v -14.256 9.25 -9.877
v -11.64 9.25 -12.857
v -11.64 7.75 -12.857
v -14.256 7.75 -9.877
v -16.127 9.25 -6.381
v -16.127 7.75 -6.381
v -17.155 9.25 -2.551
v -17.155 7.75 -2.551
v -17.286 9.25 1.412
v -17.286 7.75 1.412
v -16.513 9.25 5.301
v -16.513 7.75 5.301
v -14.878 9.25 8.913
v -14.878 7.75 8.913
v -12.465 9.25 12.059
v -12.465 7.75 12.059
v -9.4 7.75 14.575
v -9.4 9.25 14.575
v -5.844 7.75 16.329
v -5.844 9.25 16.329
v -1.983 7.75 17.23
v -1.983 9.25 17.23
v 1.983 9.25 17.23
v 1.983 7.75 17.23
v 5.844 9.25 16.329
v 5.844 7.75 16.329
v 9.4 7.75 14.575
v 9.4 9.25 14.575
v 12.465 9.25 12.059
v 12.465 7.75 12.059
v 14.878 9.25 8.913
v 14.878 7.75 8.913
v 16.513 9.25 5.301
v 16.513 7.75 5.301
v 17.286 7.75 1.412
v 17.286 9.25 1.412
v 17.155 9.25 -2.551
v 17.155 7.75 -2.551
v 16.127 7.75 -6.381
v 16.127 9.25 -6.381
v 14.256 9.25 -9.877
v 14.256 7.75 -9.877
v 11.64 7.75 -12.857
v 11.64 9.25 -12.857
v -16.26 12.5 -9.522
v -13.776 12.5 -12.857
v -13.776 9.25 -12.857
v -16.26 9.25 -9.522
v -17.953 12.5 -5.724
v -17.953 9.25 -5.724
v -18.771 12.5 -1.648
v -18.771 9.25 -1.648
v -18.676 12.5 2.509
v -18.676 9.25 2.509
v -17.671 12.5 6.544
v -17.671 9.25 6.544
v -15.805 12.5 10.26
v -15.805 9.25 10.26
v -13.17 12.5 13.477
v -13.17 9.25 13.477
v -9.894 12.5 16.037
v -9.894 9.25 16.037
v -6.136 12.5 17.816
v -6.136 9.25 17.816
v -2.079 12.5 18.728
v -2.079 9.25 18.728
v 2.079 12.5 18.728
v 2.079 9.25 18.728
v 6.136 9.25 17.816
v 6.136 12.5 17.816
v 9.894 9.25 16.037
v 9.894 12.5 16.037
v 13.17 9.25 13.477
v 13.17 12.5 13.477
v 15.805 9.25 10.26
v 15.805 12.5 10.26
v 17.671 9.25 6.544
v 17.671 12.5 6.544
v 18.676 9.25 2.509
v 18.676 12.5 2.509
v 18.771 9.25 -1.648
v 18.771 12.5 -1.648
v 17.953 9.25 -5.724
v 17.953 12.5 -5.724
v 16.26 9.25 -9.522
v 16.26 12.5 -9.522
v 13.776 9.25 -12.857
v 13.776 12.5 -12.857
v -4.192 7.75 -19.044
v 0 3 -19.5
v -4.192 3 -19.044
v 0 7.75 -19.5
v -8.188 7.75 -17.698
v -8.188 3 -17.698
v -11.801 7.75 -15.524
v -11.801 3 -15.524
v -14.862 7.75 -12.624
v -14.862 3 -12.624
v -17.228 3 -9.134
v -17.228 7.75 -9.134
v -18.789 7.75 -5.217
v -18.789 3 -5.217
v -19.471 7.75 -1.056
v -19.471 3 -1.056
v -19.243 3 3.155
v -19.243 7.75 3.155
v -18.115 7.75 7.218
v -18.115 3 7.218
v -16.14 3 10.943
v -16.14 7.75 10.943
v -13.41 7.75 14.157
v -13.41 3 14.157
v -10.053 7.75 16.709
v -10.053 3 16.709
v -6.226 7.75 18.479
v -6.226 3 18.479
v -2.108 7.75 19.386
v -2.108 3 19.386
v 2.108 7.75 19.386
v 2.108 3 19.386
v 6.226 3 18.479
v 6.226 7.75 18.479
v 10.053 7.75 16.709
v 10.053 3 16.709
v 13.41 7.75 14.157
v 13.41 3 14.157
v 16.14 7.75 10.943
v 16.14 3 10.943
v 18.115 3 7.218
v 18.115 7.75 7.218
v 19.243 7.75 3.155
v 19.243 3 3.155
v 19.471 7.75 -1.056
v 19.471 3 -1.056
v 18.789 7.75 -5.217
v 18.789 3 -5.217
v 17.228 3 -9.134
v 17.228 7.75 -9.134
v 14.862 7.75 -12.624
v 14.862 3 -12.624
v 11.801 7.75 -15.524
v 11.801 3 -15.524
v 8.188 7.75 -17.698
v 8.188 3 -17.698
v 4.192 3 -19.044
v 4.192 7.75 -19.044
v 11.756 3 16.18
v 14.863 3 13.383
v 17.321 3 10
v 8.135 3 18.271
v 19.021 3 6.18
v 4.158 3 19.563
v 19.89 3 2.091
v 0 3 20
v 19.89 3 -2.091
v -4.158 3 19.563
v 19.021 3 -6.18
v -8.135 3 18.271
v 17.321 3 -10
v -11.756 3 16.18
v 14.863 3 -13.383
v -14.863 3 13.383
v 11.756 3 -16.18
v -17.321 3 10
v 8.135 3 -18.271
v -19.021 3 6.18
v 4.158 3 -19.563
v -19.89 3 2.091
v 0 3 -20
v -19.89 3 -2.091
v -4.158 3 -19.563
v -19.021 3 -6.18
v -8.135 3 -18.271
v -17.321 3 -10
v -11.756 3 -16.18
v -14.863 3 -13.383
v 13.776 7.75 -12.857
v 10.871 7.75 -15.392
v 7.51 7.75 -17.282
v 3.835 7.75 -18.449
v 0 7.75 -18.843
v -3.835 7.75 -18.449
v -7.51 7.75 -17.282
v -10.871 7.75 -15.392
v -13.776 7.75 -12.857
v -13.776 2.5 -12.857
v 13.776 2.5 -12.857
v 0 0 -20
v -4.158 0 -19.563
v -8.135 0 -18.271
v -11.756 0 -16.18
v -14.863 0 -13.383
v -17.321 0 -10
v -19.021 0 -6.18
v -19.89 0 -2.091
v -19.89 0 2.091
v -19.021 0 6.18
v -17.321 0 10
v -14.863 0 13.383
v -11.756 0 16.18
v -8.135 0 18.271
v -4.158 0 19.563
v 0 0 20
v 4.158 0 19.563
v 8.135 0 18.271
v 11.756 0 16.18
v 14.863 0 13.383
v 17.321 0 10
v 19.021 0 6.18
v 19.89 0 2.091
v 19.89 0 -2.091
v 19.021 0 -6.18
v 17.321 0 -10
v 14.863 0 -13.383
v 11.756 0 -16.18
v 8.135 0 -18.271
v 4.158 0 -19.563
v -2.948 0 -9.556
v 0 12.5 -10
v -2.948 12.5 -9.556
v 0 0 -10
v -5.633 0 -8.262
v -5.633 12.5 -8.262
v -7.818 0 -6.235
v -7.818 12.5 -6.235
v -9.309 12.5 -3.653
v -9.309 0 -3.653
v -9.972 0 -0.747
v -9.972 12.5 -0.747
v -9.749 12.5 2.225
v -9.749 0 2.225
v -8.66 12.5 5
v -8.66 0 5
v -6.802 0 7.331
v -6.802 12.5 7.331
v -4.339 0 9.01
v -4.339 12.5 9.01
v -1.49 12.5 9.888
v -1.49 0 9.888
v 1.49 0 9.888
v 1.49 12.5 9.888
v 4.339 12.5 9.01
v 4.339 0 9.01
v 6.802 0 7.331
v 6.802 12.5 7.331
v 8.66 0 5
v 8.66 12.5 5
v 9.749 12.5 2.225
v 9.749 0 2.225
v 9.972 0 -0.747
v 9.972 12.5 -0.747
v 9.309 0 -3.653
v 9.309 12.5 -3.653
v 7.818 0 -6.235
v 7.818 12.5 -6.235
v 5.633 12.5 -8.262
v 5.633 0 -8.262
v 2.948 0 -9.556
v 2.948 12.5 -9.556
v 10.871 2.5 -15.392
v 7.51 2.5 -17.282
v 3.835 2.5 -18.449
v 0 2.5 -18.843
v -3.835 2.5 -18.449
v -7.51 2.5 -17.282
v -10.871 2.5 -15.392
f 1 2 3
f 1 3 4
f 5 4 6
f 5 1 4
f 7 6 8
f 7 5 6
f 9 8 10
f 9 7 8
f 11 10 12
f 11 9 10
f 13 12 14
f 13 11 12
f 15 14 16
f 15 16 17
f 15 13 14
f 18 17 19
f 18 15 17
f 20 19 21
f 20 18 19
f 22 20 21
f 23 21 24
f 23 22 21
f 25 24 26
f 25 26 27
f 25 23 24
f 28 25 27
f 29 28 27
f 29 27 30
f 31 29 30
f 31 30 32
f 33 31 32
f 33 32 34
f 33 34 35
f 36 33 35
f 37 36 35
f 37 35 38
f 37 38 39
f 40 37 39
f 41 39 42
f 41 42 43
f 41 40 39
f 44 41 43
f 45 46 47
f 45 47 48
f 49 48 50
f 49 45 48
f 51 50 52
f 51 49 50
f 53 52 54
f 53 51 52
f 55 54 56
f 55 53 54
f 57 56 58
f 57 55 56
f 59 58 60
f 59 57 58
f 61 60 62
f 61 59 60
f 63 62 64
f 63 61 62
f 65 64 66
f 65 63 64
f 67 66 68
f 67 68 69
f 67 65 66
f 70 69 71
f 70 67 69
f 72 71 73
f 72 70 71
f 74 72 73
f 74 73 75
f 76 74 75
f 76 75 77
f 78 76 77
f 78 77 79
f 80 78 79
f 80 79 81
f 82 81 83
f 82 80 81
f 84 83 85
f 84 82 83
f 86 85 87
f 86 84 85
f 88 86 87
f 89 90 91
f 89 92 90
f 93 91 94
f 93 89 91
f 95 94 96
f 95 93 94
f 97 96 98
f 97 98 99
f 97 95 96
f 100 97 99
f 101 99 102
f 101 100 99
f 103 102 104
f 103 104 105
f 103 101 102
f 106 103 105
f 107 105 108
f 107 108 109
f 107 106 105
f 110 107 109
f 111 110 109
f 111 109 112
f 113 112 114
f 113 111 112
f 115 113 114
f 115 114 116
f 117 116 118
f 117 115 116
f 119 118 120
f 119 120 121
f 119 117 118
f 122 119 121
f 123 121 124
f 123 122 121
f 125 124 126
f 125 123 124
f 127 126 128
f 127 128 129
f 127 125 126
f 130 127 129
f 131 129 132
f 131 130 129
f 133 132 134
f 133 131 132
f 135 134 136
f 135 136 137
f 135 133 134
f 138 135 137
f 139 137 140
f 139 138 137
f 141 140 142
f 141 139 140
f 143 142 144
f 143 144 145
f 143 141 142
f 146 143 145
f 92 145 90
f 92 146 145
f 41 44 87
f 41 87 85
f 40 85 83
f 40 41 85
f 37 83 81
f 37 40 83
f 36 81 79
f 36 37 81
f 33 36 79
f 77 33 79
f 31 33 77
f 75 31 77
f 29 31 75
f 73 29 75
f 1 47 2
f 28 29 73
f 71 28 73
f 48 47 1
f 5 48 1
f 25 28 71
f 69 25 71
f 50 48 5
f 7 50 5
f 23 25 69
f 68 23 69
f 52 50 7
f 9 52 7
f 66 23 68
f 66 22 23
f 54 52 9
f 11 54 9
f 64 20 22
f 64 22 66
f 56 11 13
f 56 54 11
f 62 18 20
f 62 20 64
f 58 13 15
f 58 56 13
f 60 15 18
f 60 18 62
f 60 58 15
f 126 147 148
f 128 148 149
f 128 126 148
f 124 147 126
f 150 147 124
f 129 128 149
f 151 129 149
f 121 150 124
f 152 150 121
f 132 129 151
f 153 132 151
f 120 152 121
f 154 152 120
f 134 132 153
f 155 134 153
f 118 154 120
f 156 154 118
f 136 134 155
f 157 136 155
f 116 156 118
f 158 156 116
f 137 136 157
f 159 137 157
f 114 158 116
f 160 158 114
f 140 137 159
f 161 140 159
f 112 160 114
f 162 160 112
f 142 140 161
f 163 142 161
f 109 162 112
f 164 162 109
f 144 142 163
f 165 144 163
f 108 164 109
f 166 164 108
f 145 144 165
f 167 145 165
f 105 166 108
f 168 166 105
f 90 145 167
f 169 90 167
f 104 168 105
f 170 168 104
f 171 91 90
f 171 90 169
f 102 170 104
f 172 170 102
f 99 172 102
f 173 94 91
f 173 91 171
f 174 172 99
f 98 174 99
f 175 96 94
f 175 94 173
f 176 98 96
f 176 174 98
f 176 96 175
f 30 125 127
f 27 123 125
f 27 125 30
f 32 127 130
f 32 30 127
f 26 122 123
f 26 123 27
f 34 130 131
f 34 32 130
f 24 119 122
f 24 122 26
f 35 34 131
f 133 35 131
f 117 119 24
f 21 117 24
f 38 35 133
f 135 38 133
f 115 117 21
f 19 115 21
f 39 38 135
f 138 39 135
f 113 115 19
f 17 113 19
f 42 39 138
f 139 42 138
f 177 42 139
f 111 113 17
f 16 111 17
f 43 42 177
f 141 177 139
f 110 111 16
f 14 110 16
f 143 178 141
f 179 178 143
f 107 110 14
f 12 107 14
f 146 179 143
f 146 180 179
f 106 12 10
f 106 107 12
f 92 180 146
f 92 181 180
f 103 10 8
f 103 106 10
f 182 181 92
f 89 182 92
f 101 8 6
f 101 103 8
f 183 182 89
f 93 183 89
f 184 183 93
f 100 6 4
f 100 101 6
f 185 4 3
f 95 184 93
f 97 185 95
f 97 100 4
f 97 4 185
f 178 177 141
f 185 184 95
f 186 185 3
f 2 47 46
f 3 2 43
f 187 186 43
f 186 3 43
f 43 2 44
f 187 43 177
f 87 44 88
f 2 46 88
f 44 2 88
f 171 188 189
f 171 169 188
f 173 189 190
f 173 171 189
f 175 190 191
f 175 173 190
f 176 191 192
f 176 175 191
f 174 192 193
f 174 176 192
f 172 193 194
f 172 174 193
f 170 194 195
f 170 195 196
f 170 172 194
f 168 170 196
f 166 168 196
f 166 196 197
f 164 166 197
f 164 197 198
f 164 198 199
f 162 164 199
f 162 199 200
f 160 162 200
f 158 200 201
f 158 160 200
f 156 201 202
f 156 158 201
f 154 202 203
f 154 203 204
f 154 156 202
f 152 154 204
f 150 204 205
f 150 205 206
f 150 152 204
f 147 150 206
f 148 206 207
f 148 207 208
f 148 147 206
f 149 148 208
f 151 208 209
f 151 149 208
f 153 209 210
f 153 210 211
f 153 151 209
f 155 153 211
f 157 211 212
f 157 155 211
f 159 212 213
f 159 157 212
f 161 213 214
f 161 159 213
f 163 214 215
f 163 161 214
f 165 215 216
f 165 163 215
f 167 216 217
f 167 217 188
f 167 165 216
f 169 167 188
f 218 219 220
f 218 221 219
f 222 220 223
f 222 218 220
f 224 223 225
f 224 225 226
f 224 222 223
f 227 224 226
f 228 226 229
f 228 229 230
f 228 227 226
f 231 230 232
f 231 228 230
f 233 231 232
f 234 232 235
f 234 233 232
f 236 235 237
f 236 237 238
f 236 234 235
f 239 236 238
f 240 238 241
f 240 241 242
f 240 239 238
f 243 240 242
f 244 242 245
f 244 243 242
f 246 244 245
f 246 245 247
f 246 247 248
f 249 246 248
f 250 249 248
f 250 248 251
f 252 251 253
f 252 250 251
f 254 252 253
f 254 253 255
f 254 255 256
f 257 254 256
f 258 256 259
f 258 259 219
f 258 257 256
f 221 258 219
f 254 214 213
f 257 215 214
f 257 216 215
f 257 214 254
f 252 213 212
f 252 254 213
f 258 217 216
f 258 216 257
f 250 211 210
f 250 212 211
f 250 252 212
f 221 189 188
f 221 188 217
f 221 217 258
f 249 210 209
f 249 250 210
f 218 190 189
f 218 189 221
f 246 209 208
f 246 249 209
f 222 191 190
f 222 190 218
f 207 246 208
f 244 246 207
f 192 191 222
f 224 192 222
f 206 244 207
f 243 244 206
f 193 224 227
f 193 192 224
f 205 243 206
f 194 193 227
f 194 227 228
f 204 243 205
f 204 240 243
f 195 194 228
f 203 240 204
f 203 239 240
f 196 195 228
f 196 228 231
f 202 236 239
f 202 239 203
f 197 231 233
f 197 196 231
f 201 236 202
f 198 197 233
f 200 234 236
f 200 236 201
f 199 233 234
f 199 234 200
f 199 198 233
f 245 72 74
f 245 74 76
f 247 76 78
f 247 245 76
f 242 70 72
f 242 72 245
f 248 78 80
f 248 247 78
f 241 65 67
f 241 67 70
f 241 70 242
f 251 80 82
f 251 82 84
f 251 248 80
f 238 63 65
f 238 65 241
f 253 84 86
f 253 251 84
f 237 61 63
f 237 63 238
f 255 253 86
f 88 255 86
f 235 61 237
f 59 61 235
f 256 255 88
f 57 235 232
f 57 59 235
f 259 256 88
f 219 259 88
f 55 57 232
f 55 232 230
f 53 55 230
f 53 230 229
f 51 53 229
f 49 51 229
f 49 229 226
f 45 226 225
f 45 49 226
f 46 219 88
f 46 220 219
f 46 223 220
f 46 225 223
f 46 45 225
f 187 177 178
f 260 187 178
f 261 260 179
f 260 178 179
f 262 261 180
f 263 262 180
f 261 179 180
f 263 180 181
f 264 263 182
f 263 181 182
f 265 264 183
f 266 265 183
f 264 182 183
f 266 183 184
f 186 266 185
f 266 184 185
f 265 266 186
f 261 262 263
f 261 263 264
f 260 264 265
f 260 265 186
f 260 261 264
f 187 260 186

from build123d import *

# Parameters (mm, degrees)
CUT_EXTRUDE3_DEPTH = 10


with BuildPart() as part:
    # Sketch1 → Revolve2 (revolve)
    with BuildSketch(Plane.XY, mode=Mode.PRIVATE) as revolve2_sk:
        Polygon((10, 0), (20, 0), (20, 3), (19.5, 3), (19.5, 7.75), (17.343396893, 7.75), (17.343396893, 9.25), (18.843396893, 9.25), (18.843396893, 12.5), (10, 12.5), align=None)
    revolve(revolve2_sk.sketch.rotate(Axis((0, 0, 0), (0, 1, 0)), 90), axis=Axis((0, 0, 0), (0, 1, 0)))

    # Sketch2 → Cut-Extrude3 (cut)
    with BuildSketch(Plane(origin=(0, 12.5, 0), x_dir=(1, 0, 0), z_dir=(0, 1, 0))):
        with BuildLine():
            ThreePointArc((13.776115673, 12.856603107), (0, 18.843396893), (-13.776115673, 12.856603107))
            Line((-13.776115673, 12.856603107), (13.776115673, 12.856603107))
        make_face()
    extrude(amount=-CUT_EXTRUDE3_DEPTH, mode=Mode.SUBTRACT)


solid = part.part
